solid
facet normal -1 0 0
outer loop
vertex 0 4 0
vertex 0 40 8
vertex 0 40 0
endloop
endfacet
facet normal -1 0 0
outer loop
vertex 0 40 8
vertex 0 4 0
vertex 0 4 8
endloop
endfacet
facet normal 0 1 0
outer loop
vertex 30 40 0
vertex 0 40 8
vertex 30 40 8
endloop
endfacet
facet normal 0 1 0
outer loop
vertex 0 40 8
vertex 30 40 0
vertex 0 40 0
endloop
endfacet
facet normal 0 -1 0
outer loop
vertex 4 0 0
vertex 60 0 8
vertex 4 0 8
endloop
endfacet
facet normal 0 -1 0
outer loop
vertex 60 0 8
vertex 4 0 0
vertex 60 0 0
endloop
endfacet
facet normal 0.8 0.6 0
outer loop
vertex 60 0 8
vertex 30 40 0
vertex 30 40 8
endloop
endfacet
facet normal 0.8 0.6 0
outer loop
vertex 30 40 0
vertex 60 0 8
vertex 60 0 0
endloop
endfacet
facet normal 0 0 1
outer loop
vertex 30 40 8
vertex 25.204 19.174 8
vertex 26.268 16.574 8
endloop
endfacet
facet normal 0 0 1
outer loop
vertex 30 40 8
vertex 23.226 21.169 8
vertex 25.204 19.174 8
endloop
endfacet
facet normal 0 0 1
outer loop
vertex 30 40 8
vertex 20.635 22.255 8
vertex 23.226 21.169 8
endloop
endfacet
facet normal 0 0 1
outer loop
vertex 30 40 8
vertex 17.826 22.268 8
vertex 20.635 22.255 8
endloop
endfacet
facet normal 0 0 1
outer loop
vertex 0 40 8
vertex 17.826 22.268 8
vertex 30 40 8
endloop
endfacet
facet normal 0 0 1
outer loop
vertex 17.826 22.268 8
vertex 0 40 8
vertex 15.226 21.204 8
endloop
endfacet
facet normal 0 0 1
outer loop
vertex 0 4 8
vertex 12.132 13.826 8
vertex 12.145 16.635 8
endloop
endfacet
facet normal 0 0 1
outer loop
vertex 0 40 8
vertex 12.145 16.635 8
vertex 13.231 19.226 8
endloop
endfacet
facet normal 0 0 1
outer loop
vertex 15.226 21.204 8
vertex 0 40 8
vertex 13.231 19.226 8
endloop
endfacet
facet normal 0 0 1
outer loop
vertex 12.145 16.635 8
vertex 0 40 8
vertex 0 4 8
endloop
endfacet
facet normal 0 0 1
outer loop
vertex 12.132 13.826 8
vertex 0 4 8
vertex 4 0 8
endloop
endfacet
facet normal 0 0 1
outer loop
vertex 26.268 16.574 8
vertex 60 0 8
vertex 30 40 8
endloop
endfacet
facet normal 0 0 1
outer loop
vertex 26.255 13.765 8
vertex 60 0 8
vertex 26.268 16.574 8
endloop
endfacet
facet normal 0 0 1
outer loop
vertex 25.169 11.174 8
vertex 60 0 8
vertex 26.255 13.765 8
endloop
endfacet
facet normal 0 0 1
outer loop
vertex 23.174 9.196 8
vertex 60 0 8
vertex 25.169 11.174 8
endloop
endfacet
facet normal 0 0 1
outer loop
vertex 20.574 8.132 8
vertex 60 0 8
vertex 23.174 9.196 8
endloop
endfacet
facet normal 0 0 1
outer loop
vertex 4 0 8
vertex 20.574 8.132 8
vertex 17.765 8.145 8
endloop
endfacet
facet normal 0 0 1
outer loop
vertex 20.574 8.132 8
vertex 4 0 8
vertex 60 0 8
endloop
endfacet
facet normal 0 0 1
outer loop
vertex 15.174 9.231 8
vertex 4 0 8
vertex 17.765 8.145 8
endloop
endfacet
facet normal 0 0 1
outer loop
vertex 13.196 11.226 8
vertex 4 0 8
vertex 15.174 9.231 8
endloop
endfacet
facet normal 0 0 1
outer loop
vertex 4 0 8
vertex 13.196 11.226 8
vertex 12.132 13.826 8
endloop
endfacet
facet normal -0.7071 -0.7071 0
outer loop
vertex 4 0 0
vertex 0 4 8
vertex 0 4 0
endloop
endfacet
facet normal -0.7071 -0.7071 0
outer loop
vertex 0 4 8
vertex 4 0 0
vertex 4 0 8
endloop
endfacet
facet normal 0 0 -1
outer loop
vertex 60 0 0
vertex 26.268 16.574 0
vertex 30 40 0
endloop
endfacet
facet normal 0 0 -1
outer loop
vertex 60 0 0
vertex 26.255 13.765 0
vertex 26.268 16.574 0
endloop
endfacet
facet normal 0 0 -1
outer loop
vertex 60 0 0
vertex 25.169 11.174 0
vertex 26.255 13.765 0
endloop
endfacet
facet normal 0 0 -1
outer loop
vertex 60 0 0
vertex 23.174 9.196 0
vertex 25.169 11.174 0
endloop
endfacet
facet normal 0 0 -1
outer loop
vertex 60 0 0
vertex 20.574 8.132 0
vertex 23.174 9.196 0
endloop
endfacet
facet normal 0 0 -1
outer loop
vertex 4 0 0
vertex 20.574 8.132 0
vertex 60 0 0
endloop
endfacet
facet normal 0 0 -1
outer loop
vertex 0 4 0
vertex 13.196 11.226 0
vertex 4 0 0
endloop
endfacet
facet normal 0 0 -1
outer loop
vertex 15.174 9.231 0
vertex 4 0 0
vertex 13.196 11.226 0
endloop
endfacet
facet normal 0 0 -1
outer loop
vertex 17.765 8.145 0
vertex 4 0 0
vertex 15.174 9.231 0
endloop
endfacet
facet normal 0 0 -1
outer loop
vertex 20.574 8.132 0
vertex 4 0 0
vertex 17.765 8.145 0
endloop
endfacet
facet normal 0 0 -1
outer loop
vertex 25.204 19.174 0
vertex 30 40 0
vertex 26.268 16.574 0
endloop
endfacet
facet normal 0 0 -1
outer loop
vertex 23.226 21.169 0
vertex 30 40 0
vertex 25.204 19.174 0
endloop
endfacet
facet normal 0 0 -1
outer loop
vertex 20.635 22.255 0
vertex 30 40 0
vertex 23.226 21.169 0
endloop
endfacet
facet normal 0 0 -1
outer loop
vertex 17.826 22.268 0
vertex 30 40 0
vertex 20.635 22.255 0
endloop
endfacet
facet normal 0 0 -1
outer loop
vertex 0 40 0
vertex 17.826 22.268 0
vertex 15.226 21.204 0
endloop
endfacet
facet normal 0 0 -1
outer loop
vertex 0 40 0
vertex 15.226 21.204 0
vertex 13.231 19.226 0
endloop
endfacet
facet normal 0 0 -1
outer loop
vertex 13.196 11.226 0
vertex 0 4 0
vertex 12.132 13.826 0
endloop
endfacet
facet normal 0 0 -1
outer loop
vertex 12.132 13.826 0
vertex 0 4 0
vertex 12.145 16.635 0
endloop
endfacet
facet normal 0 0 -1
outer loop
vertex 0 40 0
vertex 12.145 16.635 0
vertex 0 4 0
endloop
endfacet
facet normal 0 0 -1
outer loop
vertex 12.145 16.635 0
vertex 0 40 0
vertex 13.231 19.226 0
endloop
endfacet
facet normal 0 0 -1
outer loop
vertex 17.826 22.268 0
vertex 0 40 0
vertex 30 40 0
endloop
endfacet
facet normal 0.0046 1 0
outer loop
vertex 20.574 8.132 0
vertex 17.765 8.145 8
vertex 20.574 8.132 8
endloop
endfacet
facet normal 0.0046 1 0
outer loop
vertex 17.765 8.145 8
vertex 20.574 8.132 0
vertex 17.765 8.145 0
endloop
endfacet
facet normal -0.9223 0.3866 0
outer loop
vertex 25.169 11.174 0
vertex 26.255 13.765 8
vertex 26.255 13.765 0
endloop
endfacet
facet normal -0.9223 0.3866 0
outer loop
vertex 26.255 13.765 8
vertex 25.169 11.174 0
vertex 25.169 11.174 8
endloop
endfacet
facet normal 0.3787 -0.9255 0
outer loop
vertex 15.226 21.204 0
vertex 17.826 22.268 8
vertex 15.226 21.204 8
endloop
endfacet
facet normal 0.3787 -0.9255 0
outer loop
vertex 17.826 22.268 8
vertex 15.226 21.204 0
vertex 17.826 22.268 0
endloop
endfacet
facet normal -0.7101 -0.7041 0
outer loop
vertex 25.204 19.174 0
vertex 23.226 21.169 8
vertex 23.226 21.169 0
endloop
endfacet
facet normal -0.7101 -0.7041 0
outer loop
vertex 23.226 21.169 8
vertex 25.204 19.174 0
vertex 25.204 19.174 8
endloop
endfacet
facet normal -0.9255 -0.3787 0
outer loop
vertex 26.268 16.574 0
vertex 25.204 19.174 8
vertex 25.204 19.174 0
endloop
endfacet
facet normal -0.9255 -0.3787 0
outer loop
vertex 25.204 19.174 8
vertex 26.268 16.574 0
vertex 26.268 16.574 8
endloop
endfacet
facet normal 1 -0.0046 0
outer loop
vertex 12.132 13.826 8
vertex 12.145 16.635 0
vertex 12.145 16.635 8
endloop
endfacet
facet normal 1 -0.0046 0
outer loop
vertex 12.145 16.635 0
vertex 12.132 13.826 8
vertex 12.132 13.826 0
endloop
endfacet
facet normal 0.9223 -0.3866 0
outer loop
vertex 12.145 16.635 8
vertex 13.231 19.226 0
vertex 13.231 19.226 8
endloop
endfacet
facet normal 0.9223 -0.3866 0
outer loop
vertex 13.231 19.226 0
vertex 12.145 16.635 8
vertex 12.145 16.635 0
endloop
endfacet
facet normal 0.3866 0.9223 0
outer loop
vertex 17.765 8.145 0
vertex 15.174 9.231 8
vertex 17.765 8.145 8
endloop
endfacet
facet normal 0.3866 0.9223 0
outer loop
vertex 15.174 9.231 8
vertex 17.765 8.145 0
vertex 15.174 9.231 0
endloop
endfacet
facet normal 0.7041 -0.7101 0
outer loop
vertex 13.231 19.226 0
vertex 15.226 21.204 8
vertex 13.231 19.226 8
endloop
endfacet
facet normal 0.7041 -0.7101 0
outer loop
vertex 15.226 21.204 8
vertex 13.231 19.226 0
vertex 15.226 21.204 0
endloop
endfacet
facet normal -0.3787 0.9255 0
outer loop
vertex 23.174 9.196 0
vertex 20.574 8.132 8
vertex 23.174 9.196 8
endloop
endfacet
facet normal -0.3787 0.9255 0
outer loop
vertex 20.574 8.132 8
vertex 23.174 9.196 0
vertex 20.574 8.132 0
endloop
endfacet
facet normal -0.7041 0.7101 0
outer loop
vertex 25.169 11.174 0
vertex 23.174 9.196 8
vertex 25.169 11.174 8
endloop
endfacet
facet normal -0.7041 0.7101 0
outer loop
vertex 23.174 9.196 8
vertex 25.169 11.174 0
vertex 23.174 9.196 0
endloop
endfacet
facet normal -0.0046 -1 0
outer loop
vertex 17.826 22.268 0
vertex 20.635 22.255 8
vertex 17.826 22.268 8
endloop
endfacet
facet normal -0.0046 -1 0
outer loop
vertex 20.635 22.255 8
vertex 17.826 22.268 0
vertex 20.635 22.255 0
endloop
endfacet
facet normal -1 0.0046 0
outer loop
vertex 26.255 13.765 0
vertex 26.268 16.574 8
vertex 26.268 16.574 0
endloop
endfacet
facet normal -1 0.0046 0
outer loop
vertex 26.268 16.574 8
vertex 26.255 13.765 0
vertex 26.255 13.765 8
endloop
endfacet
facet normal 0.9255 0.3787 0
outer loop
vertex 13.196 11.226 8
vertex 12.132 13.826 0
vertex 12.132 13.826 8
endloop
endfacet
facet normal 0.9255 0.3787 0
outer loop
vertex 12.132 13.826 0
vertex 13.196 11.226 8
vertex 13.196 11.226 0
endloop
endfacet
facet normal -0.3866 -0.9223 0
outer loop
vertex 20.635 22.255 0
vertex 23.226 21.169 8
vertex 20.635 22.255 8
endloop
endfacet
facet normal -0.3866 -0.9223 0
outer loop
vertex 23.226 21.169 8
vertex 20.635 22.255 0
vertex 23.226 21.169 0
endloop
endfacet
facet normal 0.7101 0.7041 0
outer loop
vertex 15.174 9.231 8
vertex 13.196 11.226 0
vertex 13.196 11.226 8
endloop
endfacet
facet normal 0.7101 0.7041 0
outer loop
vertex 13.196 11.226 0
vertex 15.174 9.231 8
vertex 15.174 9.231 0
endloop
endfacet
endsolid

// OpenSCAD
$fn = 32;

// ----------------------------------------------------------------------
// Bracket plate: gusset 60 x 40
// ----------------------------------------------------------------------

// --- parameters (mm) ---
hole_r = 3.5;             // bolt hole radius
plate_t = 8;              // plate thickness, Z (extrusion height)
gus_a = 60;               // base length
gus_b = 40;               // height
top_x = 30;               // top edge X of the angled cut
light_r = 7.2;            // lightening hole radius

light_d = 2 * light_r;

profile = [[4, 0], [30, 0], [60, 0], [30, 40], [0, 40], [0, 4]];  // primary outline, 6 points, counter clockwise
void_1 = [[26.268, 16.574], [25.204, 19.174], [23.226, 21.169], [20.635, 22.255], [17.826, 22.268], [15.226, 21.204], [13.231, 19.226], [12.145, 16.635], [12.132, 13.826], [13.196, 11.226], [15.174, 9.231], [17.765, 8.145], [20.574, 8.132], [23.174, 9.196], [25.169, 11.174], [26.255, 13.765]];  // lightening hole, 16 points

// --- the one profile operation ---
difference() {
  linear_extrude(height = plate_t) polygon(points = profile);
  translate([0, 0, -1])
    linear_extrude(height = plate_t + 2) polygon(points = void_1);
}
